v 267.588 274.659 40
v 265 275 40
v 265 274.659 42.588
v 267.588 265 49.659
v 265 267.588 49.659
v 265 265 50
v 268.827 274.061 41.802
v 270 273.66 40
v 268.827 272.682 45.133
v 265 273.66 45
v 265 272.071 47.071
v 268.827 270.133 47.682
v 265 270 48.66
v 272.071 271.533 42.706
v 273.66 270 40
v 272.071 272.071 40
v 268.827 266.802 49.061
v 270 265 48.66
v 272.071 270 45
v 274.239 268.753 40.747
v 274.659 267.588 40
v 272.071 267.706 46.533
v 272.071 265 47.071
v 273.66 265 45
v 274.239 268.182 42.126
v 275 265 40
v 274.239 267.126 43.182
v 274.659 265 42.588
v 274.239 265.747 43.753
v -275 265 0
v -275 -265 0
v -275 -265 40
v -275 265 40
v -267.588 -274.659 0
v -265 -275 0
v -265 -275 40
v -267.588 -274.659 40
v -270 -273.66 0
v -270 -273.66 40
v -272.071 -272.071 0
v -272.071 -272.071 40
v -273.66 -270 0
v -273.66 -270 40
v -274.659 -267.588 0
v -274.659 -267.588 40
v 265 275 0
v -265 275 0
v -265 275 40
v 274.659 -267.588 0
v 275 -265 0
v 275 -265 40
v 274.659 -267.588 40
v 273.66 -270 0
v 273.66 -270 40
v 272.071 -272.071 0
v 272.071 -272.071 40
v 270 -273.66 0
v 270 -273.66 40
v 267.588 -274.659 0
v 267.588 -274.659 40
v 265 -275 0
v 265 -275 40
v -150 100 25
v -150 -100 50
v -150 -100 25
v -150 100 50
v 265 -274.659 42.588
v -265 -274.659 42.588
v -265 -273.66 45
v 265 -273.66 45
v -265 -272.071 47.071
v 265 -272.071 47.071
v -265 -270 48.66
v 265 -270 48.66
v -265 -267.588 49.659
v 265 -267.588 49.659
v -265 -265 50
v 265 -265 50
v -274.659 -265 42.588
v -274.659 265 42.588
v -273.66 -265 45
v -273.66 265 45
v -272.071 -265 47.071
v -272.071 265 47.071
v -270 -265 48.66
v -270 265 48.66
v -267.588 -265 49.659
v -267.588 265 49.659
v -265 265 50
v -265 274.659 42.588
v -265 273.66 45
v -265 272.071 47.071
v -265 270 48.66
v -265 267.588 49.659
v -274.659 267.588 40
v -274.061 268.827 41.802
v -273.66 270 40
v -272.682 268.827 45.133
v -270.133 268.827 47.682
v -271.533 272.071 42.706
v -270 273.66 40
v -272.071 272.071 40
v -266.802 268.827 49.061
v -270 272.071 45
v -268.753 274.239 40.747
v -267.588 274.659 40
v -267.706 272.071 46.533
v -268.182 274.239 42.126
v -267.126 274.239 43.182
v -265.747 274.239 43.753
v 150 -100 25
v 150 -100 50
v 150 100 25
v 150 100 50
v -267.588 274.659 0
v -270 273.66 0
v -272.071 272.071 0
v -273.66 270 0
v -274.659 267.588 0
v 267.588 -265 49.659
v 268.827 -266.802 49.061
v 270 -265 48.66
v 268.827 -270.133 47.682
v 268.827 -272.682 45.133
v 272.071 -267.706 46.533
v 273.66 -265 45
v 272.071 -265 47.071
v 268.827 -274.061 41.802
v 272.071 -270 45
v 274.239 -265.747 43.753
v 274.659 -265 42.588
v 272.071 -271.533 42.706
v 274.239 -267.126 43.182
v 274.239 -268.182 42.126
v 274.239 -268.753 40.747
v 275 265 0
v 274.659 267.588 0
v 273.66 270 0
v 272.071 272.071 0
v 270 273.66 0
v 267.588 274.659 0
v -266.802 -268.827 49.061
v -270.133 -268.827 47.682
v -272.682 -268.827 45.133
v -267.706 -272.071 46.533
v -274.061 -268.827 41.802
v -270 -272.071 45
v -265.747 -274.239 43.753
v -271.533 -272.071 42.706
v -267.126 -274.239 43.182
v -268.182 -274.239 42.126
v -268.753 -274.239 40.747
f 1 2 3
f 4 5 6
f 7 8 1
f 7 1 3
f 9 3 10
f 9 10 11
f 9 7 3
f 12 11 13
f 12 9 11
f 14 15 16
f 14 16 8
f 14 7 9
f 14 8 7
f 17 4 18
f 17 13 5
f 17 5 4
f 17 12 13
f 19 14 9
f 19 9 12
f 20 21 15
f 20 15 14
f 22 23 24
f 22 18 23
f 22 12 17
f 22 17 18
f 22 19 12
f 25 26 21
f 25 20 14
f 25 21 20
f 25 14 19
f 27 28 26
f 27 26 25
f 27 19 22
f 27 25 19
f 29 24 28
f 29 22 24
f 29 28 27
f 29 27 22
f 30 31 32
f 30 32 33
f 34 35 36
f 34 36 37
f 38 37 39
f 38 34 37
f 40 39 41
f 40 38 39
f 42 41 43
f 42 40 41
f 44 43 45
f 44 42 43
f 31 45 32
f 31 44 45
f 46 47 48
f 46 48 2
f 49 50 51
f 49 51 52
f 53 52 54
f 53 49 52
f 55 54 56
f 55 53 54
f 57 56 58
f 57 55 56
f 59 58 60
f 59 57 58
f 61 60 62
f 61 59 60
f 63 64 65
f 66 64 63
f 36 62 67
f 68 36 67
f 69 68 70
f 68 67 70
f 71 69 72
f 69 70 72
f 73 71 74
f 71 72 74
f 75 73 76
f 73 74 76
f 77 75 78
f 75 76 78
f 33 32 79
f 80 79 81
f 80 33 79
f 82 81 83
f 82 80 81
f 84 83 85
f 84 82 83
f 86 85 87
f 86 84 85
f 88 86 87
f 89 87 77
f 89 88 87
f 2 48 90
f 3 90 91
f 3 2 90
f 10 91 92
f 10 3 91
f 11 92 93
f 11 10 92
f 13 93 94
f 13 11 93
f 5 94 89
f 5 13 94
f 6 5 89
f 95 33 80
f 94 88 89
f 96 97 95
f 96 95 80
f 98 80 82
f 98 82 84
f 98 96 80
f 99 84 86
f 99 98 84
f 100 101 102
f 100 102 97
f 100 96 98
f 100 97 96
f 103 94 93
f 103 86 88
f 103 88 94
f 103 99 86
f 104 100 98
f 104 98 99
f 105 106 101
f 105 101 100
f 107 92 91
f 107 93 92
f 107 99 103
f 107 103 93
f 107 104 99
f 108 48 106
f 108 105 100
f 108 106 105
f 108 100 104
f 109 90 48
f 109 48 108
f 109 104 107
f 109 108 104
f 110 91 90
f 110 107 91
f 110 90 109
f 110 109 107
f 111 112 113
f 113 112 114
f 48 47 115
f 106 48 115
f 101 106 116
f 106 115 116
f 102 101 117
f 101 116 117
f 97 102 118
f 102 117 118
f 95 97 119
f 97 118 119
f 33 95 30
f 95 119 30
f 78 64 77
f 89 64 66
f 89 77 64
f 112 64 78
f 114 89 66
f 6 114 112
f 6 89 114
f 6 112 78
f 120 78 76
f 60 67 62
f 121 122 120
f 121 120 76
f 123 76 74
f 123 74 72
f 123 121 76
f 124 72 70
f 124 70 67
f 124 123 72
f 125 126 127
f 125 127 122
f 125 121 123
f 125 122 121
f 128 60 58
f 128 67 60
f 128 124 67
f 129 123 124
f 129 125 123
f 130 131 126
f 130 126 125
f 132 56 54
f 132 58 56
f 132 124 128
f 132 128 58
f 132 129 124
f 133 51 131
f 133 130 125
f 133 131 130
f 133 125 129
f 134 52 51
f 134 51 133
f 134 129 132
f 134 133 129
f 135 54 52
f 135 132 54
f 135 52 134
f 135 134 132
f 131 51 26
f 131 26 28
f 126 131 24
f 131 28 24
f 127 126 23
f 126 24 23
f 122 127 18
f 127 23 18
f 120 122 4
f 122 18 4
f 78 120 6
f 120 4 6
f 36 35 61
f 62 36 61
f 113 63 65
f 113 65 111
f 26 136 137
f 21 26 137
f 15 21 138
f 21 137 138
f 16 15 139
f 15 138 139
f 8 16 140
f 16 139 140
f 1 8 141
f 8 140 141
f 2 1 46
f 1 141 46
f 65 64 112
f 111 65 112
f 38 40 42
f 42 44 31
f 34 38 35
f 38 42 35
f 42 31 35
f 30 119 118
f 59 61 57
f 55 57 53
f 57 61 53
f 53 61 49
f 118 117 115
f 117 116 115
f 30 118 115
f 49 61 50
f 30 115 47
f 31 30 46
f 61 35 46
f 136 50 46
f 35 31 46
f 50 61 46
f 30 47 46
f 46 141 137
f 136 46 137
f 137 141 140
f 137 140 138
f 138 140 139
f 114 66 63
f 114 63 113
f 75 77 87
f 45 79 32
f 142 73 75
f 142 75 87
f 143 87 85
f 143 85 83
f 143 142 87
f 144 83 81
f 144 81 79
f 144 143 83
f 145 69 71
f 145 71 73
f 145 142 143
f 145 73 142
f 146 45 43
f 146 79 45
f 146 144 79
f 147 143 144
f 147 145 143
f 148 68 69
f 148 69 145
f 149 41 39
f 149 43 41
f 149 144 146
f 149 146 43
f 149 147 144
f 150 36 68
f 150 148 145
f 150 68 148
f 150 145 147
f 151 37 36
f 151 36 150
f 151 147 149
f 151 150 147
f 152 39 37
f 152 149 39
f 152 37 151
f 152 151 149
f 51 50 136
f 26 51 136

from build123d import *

# Parameters (mm, degrees)
F0_W         = 550
F0_H         = 550
F1_DEPTH     = 50
F2_R         = 10
F3_T1_DEPTH  = 65
F3_S5_W      = 10
F3_S5_H      = 10
F3_T6_DEPTH  = 10
F3_S11_W     = 10
F3_S11_H     = 10
F3_T12_DEPTH = 10
F3_S17_W     = 10
F3_S17_H     = 10
F3_T18_DEPTH = 10
F3_S23_W     = 10
F3_S23_H     = 10
F3_T24_DEPTH = 10
F4_W         = 300
F4_H         = 200
F5_DEPTH     = 25


# Not quite as in the source:
# - a fillet or chamfer that OpenCascade refuses, or shapes differently, is made with other operations: its cross-section is extruded or revolved along the edge and cut away or added


with BuildPart() as f1:
    # F0 (on Top) → F1 (new body)
    with BuildSketch(Plane.XY):
        Rectangle(F0_W, F0_H)
    extrude(amount=F1_DEPTH)

    # F2
    f2_edges = [f1.edges().sort_by_distance(p)[0] for p in [
        (0, -275, 50),
        (275, 0, 50),
        (0, 275, 50),
        (-275, 0, 50),
    ]]
    fillet(f2_edges, radius=F2_R)

    # F3: fillet of radius 10 on 4 edges, made by hand

    # F3_s2 → F3_t1 (cut)
    with BuildSketch(Plane.XY.offset(-25)):
        with BuildLine():
            ThreePointArc((275, -265), (272.0710678119, -272.0710678119), (265, -275))
            Line((265, -275), (275, -275))
            Line((275, -275), (275, -265))
        make_face()
        with BuildLine():
            ThreePointArc((-265, -275), (-272.0710678119, -272.0710678119), (-275, -265))
            Line((-275, -265), (-275, -275))
            Line((-275, -275), (-265, -275))
        make_face()
        with BuildLine():
            ThreePointArc((-265, 275), (-272.0710678119, 272.0710678119), (-275, 265))
            Line((-275, 265), (-275, 275))
            Line((-275, 275), (-265, 275))
        make_face()
        with BuildLine():
            ThreePointArc((275, 265), (272.0710678119, 272.0710678119), (265, 275))
            Line((265, 275), (275, 275))
            Line((275, 275), (275, 265))
        make_face()
    extrude(amount=F3_T1_DEPTH, mode=Mode.SUBTRACT)


with BuildPart() as f3_tool4:
    # F3_s5 → F3_t6 (new body)
    with BuildSketch(Plane.YZ.offset(265)):
        with Locations((270, 45)):
            Rectangle(F3_S5_W, F3_S5_H)
    extrude(amount=F3_T6_DEPTH)

    # F3_s7 → F3_t8 (revolve, cut)
    with BuildSketch(Plane(origin=(265, 265, 40), x_dir=(0, -0.7071067812, -0.7071067812), z_dir=(0, -0.7071067812, 0.7071067812))):
        with BuildLine():
            ThreePointArc((0, -10), (10, 0), (0, 10))
            Line((0, 10), (0, -10))
        make_face()
    revolve(axis=Axis((265, 265, 40), (1, 0, 0)), mode=Mode.SUBTRACT)


with BuildPart() as f1_1:
    add(f1.part)

    # F3_t3: cut F3_tool4
    add(f3_tool4.part, mode=Mode.SUBTRACT)


with BuildPart() as f3_tool10:
    # F3_s11 → F3_t12 (new body)
    with BuildSketch(Plane.XZ.offset(-265)):
        with Locations((-270, 45)):
            Rectangle(F3_S11_W, F3_S11_H)
    extrude(amount=-F3_T12_DEPTH)

    # F3_s13 → F3_t14 (revolve, cut)
    with BuildSketch(Plane(origin=(-265, 265, 40), x_dir=(0.7071067812, 0, -0.7071067812), z_dir=(0.7071067812, 0, 0.7071067812))):
        with BuildLine():
            ThreePointArc((0, -10), (10, 0), (0, 10))
            Line((0, 10), (0, -10))
        make_face()
    revolve(axis=Axis((-265, 265, 40), (0, 1, 0)), mode=Mode.SUBTRACT)


with BuildPart() as f1_2:
    add(f1_1.part)

    # F3_t9: cut F3_tool10
    add(f3_tool10.part, mode=Mode.SUBTRACT)


with BuildPart() as f3_tool16:
    # F3_s17 → F3_t18 (new body)
    with BuildSketch(Plane.XZ.offset(265)):
        with Locations((-270, 45)):
            Rectangle(F3_S17_W, F3_S17_H)
    extrude(amount=F3_T18_DEPTH)

    # F3_s19 → F3_t20 (revolve, cut)
    with BuildSketch(Plane(origin=(-265, -265, 40), x_dir=(0.7071067812, 0, -0.7071067812), z_dir=(-0.7071067812, 0, -0.7071067812))):
        with BuildLine():
            ThreePointArc((0, -10), (10, 0), (0, 10))
            Line((0, 10), (0, -10))
        make_face()
    revolve(axis=Axis((-265, -265, 40), (0, -1, 0)), mode=Mode.SUBTRACT)


with BuildPart() as f1_3:
    add(f1_2.part)

    # F3_t15: cut F3_tool16
    add(f3_tool16.part, mode=Mode.SUBTRACT)


with BuildPart() as f3_tool22:
    # F3_s23 → F3_t24 (new body)
    with BuildSketch(Plane.YZ.offset(265)):
        with Locations((-270, 45)):
            Rectangle(F3_S23_W, F3_S23_H)
    extrude(amount=F3_T24_DEPTH)

    # F3_s25 → F3_t26 (revolve, cut)
    with BuildSketch(Plane(origin=(265, -265, 40), x_dir=(0, 0.7071067812, -0.7071067812), z_dir=(0, -0.7071067812, -0.7071067812))):
        with BuildLine():
            ThreePointArc((0, -10), (10, 0), (0, 10))
            Line((0, 10), (0, -10))
        make_face()
    revolve(axis=Axis((265, -265, 40), (1, 0, 0)), mode=Mode.SUBTRACT)


with BuildPart() as f1_4:
    add(f1_3.part)

    # F3_t21: cut F3_tool22
    add(f3_tool22.part, mode=Mode.SUBTRACT)

    # F4 (on face) → F5 (cut)
    with BuildSketch(Plane.XY.offset(50)):
        Rectangle(F4_W, F4_H)
    extrude(amount=-F5_DEPTH, mode=Mode.SUBTRACT)


solid = f1_4.part
